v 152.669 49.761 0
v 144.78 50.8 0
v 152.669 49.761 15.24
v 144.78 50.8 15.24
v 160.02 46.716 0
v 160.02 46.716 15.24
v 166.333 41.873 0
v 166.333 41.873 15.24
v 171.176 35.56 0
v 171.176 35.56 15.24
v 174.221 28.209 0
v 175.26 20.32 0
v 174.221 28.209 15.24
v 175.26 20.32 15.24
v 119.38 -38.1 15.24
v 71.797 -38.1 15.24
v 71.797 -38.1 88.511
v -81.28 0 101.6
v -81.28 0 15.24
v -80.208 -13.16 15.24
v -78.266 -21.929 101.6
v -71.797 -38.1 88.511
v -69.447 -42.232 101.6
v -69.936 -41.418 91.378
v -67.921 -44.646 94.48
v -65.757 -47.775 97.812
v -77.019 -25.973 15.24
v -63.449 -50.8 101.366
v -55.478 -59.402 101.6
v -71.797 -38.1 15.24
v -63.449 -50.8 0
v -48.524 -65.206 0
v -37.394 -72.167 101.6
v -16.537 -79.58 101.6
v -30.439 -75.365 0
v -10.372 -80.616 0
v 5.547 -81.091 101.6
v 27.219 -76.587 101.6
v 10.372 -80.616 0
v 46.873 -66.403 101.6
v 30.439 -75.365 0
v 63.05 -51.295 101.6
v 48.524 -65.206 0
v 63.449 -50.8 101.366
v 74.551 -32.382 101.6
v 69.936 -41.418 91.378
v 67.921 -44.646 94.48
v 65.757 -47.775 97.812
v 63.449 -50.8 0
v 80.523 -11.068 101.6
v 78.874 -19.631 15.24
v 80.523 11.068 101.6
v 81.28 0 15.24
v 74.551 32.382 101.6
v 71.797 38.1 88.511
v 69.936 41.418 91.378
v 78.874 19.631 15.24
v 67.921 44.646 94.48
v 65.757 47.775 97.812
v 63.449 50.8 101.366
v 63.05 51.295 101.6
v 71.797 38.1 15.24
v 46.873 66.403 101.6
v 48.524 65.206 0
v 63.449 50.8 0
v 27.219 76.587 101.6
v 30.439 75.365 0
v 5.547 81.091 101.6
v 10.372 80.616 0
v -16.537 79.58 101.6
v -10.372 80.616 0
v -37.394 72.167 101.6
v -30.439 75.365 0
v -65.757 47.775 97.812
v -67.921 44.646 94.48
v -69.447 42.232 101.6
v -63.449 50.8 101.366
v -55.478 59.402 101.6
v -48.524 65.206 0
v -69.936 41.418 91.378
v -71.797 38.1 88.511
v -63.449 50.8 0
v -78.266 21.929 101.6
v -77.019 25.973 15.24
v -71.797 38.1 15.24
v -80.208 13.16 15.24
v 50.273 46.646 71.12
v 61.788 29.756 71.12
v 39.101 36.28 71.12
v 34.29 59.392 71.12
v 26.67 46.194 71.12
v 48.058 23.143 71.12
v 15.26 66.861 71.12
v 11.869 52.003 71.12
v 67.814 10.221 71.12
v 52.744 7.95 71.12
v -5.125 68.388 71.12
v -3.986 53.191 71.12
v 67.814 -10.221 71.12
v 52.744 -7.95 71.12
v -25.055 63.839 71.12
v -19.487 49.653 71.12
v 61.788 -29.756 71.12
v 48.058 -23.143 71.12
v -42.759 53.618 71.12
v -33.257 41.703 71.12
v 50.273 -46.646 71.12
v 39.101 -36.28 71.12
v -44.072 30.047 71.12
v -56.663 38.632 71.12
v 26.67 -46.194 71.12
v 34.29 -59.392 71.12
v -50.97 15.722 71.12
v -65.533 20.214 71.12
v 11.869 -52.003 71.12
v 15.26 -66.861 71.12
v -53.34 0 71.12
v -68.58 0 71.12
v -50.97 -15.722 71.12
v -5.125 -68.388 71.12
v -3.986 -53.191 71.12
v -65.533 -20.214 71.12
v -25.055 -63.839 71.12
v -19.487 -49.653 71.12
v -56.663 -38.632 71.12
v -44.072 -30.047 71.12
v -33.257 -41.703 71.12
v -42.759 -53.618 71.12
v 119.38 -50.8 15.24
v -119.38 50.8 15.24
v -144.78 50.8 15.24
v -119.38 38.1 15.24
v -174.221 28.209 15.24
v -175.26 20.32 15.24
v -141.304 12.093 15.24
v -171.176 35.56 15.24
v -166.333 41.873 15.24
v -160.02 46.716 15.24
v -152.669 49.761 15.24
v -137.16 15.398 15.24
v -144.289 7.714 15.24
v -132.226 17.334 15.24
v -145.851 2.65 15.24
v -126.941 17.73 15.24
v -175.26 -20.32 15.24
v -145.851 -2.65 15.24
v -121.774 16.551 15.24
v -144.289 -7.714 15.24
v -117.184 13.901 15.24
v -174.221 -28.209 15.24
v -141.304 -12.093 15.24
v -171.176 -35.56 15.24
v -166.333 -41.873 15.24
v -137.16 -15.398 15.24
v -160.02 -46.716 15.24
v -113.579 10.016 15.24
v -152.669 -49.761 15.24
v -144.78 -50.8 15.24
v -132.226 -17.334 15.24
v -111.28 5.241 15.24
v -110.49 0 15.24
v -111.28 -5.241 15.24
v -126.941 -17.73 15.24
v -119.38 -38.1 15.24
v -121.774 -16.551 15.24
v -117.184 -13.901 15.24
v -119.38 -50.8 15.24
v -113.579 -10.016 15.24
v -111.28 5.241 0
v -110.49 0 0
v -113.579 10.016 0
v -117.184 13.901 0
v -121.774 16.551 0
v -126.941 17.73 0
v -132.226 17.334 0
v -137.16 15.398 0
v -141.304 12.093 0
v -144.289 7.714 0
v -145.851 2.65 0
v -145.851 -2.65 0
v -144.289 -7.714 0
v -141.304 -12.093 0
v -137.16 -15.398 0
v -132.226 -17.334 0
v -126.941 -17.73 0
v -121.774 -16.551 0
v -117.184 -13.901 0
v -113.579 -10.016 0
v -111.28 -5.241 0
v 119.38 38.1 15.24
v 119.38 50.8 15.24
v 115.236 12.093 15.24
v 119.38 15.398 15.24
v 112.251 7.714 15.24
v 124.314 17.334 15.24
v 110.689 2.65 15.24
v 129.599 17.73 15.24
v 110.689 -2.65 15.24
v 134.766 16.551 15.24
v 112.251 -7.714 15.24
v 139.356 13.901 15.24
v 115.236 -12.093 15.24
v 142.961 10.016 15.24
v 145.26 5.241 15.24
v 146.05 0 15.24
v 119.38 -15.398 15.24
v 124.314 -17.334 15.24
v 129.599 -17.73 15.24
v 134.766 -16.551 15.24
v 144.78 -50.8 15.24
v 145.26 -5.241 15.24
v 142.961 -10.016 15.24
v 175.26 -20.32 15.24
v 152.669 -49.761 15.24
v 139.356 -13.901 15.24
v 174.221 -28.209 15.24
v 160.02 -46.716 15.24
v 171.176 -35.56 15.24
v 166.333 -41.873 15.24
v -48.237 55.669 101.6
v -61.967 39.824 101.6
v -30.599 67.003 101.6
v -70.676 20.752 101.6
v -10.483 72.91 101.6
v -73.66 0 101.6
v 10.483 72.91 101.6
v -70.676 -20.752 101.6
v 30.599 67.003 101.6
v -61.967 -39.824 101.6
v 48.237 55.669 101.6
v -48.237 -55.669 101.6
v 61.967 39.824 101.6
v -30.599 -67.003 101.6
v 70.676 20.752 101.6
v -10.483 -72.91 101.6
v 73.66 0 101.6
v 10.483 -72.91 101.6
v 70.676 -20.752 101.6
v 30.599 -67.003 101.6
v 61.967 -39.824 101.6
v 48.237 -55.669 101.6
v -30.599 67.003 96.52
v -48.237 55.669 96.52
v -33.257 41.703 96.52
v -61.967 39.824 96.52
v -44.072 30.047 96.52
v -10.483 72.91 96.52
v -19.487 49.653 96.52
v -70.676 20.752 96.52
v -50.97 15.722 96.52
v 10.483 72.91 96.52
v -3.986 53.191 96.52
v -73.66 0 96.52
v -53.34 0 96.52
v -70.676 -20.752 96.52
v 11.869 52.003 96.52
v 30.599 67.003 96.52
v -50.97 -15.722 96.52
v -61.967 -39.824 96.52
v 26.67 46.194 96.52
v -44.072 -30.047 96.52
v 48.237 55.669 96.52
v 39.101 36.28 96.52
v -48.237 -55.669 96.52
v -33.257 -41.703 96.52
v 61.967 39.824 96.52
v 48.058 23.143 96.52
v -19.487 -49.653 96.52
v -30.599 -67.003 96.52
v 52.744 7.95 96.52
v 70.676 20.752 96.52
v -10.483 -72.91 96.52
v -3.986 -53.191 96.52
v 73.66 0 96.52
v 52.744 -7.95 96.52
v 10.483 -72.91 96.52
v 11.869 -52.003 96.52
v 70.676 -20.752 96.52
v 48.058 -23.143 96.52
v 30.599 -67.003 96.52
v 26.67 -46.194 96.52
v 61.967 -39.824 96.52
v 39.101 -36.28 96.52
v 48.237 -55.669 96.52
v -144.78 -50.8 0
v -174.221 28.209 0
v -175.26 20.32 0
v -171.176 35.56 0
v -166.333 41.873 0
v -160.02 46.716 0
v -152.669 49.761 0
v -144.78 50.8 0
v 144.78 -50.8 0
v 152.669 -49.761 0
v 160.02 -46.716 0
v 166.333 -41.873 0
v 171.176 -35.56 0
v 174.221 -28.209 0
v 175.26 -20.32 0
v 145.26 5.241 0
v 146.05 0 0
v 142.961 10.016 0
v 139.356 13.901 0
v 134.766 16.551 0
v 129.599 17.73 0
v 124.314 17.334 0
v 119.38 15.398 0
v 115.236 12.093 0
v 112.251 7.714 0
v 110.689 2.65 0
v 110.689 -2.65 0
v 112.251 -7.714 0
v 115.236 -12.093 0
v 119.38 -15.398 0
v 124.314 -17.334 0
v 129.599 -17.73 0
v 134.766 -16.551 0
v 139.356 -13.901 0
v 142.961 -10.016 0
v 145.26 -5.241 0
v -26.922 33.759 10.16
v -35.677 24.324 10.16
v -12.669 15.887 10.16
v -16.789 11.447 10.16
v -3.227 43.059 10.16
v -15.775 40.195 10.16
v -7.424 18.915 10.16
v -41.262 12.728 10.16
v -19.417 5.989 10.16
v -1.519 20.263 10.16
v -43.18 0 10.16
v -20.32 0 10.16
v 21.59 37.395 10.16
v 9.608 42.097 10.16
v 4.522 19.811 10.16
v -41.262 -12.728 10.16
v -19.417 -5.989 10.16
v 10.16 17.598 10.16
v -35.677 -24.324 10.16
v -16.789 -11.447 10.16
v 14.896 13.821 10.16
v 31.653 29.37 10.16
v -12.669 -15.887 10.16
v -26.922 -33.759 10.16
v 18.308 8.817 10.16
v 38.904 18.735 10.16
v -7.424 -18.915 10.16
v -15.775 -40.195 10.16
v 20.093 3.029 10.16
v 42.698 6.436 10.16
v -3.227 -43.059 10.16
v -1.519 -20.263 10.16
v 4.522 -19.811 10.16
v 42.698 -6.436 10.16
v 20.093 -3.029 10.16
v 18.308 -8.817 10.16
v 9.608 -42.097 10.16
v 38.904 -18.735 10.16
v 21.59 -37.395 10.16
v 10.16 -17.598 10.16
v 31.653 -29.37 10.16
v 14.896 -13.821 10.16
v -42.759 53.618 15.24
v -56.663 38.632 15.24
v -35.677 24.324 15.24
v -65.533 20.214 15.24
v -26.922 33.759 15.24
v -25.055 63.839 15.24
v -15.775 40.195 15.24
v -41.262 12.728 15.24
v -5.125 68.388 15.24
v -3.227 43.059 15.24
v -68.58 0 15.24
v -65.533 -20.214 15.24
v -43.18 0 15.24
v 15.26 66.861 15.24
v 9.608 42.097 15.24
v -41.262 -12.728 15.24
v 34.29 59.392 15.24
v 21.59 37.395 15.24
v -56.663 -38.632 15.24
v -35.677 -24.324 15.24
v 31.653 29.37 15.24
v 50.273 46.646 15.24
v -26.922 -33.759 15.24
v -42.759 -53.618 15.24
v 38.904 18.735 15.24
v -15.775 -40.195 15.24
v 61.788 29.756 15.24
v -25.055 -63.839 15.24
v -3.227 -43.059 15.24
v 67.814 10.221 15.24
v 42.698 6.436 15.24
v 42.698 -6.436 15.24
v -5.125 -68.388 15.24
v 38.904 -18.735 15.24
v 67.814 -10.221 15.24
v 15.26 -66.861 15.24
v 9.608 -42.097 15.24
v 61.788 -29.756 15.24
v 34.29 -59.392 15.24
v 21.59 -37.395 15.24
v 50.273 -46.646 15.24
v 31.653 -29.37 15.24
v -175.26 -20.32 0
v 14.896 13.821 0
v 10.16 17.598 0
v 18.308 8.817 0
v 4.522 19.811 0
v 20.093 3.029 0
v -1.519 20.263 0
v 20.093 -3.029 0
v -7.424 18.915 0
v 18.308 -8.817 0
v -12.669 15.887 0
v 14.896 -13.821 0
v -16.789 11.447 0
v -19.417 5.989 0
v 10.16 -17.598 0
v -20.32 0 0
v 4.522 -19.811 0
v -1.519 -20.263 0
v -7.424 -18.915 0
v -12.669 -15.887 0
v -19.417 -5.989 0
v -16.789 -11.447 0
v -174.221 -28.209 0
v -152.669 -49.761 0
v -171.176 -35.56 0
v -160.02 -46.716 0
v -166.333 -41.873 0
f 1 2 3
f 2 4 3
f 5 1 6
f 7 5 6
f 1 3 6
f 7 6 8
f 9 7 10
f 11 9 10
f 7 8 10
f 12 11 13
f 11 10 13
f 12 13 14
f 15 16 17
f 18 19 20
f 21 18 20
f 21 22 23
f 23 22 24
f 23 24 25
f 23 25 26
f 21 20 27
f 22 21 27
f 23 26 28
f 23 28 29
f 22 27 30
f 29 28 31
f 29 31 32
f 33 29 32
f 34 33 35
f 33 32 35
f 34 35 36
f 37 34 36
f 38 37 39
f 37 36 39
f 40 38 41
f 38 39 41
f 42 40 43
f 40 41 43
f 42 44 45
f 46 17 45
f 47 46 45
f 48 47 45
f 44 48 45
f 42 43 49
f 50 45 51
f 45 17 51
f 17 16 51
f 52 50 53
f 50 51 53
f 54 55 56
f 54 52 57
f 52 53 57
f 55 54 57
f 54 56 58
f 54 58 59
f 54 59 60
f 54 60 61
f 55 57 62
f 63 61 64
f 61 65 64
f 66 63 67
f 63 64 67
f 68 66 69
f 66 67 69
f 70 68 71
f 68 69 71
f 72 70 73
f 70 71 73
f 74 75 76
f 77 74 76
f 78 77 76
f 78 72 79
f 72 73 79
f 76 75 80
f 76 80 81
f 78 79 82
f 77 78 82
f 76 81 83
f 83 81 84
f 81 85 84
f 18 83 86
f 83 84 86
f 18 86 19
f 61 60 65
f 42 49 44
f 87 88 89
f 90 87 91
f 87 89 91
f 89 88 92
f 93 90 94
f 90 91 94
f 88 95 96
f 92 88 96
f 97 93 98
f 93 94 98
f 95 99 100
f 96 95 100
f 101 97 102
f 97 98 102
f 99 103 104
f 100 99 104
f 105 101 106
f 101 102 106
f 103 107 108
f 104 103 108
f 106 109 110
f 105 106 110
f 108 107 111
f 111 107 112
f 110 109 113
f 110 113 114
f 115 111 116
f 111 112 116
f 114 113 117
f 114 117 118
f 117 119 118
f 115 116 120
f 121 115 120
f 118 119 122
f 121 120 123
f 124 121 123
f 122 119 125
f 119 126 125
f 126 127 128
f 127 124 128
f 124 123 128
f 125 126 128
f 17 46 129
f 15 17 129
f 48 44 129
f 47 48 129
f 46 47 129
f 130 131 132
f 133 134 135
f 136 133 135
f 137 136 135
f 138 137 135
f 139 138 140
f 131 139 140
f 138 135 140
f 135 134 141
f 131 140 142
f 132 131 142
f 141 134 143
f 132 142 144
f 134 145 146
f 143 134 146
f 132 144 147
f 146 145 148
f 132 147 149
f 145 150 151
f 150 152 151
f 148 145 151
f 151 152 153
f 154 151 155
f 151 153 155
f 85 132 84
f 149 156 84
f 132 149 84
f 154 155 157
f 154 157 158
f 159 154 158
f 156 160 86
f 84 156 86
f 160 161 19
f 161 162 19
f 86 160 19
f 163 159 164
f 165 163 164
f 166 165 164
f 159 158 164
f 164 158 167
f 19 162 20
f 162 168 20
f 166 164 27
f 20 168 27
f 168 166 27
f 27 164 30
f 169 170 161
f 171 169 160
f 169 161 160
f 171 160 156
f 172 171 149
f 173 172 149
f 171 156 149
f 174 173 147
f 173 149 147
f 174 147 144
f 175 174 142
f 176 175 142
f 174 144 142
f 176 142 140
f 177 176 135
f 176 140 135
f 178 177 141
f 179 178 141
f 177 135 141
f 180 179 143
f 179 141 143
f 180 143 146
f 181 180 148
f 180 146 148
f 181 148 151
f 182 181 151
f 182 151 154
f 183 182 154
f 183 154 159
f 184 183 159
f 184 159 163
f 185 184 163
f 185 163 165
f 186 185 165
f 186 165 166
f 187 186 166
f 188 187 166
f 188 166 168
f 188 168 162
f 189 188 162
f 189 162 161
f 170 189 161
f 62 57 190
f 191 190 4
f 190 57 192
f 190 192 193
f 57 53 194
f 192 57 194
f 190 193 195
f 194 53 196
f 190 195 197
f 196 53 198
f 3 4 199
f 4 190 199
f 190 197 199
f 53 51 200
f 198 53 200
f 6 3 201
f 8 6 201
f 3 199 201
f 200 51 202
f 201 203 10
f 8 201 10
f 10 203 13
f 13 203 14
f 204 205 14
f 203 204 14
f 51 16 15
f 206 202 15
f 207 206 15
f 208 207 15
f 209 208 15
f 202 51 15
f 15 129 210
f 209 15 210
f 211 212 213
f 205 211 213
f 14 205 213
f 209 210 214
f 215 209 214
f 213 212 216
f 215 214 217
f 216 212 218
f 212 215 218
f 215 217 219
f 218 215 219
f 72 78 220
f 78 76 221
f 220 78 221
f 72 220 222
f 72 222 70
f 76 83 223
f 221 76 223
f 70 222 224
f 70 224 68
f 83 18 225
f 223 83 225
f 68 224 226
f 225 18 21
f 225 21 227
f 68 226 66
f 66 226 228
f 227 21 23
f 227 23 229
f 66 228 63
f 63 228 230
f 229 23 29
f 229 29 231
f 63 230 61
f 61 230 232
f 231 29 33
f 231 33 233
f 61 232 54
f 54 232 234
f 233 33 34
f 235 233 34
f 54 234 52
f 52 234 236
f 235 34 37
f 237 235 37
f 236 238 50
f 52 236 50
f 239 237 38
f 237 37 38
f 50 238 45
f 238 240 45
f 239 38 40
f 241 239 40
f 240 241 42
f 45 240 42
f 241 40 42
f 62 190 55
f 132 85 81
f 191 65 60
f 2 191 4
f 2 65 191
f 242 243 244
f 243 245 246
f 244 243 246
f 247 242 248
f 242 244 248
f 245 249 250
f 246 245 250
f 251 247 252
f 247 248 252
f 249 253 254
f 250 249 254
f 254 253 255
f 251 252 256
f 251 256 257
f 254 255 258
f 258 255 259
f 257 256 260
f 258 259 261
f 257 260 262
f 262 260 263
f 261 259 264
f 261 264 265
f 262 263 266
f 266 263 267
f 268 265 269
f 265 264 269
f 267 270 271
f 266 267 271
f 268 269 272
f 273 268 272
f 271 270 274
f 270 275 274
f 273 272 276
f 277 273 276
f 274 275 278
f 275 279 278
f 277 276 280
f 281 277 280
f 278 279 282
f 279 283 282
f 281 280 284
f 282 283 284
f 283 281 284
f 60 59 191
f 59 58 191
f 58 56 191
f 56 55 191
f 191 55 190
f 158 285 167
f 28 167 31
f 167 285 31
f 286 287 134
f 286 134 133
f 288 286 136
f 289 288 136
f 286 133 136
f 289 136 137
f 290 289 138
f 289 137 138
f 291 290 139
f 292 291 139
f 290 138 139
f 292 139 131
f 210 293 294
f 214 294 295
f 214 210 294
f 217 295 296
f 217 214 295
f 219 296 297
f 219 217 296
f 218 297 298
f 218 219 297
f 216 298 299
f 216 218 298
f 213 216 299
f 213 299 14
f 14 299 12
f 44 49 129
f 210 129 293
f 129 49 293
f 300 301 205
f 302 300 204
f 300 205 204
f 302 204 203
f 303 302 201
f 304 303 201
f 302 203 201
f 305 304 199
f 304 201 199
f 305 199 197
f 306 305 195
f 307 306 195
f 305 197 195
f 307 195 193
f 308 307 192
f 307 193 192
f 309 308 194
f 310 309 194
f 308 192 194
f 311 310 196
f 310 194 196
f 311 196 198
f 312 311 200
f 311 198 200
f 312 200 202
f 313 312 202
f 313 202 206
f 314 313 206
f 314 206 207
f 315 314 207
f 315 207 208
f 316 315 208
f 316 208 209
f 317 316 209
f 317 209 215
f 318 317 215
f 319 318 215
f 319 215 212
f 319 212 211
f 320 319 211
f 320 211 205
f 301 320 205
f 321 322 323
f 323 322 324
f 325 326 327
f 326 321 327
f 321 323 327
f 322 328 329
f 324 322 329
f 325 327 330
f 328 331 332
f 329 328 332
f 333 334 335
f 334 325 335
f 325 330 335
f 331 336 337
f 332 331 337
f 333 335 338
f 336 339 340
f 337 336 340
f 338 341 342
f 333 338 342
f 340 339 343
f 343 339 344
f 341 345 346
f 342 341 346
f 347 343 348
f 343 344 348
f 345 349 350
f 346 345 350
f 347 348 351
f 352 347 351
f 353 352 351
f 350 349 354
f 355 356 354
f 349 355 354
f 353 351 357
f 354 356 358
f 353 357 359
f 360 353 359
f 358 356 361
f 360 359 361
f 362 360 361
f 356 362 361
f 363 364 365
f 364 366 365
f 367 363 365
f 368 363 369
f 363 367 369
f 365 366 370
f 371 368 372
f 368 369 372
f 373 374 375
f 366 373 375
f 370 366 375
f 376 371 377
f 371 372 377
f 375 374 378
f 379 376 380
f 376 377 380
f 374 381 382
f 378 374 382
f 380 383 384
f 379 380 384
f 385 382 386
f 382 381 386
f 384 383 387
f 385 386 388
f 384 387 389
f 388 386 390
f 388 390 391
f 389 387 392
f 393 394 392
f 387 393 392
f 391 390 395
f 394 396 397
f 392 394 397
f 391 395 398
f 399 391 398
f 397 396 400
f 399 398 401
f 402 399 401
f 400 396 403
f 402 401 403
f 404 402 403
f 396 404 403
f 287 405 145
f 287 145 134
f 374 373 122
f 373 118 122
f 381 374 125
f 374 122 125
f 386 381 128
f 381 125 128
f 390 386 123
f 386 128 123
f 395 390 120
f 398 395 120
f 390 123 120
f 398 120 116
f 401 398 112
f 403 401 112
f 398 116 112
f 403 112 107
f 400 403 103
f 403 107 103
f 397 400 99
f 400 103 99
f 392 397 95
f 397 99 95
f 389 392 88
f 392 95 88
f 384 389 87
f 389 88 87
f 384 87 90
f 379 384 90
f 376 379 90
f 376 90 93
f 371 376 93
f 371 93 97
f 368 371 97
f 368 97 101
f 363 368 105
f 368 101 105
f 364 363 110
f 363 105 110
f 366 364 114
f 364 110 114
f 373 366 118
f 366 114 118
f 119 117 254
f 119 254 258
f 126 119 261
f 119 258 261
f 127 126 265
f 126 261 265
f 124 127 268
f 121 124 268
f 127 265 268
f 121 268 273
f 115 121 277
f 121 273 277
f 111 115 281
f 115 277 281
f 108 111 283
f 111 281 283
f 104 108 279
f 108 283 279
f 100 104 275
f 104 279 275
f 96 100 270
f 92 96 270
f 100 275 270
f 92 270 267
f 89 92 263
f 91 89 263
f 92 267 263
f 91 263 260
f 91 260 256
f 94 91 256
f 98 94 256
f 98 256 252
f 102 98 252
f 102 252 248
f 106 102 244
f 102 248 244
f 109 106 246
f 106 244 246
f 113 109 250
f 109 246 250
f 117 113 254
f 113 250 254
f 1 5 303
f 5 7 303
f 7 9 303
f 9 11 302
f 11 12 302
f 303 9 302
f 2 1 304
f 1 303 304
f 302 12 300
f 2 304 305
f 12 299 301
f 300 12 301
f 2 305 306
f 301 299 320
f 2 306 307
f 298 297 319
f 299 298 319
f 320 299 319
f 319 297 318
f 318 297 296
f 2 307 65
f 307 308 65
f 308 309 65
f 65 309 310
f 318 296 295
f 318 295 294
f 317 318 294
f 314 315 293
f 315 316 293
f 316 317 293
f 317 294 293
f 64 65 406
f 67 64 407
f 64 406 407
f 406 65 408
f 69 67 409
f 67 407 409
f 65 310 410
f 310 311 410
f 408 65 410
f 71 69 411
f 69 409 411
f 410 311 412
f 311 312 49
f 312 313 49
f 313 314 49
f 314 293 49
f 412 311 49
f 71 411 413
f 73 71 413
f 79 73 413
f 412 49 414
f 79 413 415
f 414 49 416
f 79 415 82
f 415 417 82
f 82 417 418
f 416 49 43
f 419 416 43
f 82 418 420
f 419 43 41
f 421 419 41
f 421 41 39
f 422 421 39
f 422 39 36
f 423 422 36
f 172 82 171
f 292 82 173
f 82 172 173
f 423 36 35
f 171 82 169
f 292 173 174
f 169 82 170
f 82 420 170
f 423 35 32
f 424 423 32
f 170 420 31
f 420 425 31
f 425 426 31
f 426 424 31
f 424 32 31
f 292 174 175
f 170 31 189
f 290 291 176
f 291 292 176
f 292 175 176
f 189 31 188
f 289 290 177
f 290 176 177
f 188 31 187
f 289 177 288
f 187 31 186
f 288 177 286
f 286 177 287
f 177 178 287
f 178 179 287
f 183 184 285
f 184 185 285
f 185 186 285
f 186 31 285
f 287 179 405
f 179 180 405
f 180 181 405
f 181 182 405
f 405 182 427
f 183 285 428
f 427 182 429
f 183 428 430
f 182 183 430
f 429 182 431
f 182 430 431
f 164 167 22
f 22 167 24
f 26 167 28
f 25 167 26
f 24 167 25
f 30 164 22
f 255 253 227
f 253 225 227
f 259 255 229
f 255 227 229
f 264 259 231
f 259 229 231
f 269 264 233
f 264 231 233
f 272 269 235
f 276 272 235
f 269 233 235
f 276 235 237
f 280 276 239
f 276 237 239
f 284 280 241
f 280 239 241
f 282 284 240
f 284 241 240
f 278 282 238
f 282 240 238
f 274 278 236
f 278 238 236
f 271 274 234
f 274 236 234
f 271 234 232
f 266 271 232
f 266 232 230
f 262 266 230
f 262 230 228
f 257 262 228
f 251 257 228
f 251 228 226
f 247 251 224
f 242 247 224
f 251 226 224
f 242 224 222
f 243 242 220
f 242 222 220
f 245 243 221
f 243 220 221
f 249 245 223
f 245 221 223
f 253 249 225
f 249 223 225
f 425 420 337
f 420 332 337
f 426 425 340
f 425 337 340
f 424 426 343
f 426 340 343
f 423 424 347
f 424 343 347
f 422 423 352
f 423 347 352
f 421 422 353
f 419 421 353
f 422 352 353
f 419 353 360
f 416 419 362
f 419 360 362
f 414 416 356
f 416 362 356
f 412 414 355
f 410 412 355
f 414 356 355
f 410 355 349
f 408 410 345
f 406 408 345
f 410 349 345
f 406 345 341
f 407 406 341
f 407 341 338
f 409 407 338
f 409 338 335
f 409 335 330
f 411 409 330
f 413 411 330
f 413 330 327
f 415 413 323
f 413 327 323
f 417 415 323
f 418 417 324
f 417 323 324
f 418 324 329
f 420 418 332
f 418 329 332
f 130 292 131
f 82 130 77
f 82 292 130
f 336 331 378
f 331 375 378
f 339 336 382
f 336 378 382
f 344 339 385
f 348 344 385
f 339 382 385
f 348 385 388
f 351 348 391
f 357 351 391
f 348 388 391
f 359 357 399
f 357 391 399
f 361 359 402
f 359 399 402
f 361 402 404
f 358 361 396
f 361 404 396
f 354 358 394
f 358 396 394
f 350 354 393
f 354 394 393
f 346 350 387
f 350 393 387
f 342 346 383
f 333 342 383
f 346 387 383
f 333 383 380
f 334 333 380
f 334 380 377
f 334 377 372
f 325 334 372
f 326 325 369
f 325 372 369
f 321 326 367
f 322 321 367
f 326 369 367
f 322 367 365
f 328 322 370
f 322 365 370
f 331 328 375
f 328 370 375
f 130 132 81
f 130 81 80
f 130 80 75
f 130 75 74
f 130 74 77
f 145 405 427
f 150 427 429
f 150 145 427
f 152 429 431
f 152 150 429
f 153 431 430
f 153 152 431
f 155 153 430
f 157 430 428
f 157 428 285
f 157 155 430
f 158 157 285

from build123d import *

# Parameters (mm, degrees)
F0_W      = 350.52
F0_H      = 101.6
F1_DEPTH  = 101.6
F3_DEPTH  = 135.89
F4_W      = 56.0828397485
F4_H      = 76.2
F4_W_2    = 126.5943205029
F5_DEPTH  = 86.36
F6_R      = 81.28
F6_W      = 126.5943205029
F6_H      = 12.7
F7_DEPTH  = 214.122
F11_R     = 30.48
F12_R     = 17.78
F13_DEPTH = 25.4


with BuildPart() as f1:
    # F0 (on Top) → F1 (new body)
    with BuildSketch(Plane.XY):
        Rectangle(F0_W, F0_H)
    extrude(amount=F1_DEPTH)

    # F2 (on face) → F3 (cut)
    with BuildSketch(Plane.XZ.offset(50.8)):
        Polygon((-175.26, 101.6), (-175.26, 15.24), (-119.38, 15.24), (-63.2971602515, 101.6), align=None)
        Polygon((175.26, 101.6), (63.2971602515, 101.6), (119.38, 15.24), (175.26, 15.24), align=None)
    extrude(amount=-F3_DEPTH, mode=Mode.SUBTRACT)

    # F4 (on face) → F5 (cut)
    with BuildSketch(Plane.XY.offset(101.6)):
        with Locations((-91.3385801257, 0)):
            Rectangle(F4_W, F4_H)
        Rectangle(F4_W_2, F4_H)
        with Locations((91.3385801257, 0)):
            Rectangle(F4_W, F4_H)
    extrude(amount=-F5_DEPTH, mode=Mode.SUBTRACT)

    # F6 (on face) → F7 (cut)
    with BuildSketch(Plane.XY.offset(101.6)):
        Circle(F6_R)
        with Locations((0, -44.45)):
            Rectangle(F6_W, F6_H, mode=Mode.SUBTRACT)
        with Locations((0, -44.45)):
            Rectangle(F6_W, F6_H)
    extrude(amount=-F7_DEPTH, mode=Mode.SUBTRACT)

    # F8 (on Front) → F10 (revolve)
    with BuildSketch(Plane.XZ):
        Polygon((-81.28, 0), (-20.32, 0), (-20.32, 10.16), (-43.18, 10.16), (-43.18, 15.24), (-68.58, 15.24), (-68.58, 71.12), (-53.34, 71.12), (-53.34, 96.52), (-73.66, 96.52), (-73.66, 101.6), (-81.28, 101.6), align=None)
    revolve(axis=Axis((0, 0, 50.3256209195), (0, 0, 1)))

    # F11
    f11_edges = [f1.edges().sort_by_distance(p)[0] for p in [
        (175.26, -50.8, 7.62),
        (175.26, 50.8, 7.62),
        (-175.26, -50.8, 7.62),
        (-175.26, 50.8, 7.62),
    ]]
    fillet(f11_edges, radius=F11_R)

    # F12 (on face) → F13 (cut)
    with BuildSketch(Plane.XY.offset(15.24)):
        with Locations((-128.27, 0)):
            Circle(F12_R)
        with Locations((128.27, 0)):
            Circle(F12_R)
    extrude(amount=-F13_DEPTH, mode=Mode.SUBTRACT)


solid = f1.part
